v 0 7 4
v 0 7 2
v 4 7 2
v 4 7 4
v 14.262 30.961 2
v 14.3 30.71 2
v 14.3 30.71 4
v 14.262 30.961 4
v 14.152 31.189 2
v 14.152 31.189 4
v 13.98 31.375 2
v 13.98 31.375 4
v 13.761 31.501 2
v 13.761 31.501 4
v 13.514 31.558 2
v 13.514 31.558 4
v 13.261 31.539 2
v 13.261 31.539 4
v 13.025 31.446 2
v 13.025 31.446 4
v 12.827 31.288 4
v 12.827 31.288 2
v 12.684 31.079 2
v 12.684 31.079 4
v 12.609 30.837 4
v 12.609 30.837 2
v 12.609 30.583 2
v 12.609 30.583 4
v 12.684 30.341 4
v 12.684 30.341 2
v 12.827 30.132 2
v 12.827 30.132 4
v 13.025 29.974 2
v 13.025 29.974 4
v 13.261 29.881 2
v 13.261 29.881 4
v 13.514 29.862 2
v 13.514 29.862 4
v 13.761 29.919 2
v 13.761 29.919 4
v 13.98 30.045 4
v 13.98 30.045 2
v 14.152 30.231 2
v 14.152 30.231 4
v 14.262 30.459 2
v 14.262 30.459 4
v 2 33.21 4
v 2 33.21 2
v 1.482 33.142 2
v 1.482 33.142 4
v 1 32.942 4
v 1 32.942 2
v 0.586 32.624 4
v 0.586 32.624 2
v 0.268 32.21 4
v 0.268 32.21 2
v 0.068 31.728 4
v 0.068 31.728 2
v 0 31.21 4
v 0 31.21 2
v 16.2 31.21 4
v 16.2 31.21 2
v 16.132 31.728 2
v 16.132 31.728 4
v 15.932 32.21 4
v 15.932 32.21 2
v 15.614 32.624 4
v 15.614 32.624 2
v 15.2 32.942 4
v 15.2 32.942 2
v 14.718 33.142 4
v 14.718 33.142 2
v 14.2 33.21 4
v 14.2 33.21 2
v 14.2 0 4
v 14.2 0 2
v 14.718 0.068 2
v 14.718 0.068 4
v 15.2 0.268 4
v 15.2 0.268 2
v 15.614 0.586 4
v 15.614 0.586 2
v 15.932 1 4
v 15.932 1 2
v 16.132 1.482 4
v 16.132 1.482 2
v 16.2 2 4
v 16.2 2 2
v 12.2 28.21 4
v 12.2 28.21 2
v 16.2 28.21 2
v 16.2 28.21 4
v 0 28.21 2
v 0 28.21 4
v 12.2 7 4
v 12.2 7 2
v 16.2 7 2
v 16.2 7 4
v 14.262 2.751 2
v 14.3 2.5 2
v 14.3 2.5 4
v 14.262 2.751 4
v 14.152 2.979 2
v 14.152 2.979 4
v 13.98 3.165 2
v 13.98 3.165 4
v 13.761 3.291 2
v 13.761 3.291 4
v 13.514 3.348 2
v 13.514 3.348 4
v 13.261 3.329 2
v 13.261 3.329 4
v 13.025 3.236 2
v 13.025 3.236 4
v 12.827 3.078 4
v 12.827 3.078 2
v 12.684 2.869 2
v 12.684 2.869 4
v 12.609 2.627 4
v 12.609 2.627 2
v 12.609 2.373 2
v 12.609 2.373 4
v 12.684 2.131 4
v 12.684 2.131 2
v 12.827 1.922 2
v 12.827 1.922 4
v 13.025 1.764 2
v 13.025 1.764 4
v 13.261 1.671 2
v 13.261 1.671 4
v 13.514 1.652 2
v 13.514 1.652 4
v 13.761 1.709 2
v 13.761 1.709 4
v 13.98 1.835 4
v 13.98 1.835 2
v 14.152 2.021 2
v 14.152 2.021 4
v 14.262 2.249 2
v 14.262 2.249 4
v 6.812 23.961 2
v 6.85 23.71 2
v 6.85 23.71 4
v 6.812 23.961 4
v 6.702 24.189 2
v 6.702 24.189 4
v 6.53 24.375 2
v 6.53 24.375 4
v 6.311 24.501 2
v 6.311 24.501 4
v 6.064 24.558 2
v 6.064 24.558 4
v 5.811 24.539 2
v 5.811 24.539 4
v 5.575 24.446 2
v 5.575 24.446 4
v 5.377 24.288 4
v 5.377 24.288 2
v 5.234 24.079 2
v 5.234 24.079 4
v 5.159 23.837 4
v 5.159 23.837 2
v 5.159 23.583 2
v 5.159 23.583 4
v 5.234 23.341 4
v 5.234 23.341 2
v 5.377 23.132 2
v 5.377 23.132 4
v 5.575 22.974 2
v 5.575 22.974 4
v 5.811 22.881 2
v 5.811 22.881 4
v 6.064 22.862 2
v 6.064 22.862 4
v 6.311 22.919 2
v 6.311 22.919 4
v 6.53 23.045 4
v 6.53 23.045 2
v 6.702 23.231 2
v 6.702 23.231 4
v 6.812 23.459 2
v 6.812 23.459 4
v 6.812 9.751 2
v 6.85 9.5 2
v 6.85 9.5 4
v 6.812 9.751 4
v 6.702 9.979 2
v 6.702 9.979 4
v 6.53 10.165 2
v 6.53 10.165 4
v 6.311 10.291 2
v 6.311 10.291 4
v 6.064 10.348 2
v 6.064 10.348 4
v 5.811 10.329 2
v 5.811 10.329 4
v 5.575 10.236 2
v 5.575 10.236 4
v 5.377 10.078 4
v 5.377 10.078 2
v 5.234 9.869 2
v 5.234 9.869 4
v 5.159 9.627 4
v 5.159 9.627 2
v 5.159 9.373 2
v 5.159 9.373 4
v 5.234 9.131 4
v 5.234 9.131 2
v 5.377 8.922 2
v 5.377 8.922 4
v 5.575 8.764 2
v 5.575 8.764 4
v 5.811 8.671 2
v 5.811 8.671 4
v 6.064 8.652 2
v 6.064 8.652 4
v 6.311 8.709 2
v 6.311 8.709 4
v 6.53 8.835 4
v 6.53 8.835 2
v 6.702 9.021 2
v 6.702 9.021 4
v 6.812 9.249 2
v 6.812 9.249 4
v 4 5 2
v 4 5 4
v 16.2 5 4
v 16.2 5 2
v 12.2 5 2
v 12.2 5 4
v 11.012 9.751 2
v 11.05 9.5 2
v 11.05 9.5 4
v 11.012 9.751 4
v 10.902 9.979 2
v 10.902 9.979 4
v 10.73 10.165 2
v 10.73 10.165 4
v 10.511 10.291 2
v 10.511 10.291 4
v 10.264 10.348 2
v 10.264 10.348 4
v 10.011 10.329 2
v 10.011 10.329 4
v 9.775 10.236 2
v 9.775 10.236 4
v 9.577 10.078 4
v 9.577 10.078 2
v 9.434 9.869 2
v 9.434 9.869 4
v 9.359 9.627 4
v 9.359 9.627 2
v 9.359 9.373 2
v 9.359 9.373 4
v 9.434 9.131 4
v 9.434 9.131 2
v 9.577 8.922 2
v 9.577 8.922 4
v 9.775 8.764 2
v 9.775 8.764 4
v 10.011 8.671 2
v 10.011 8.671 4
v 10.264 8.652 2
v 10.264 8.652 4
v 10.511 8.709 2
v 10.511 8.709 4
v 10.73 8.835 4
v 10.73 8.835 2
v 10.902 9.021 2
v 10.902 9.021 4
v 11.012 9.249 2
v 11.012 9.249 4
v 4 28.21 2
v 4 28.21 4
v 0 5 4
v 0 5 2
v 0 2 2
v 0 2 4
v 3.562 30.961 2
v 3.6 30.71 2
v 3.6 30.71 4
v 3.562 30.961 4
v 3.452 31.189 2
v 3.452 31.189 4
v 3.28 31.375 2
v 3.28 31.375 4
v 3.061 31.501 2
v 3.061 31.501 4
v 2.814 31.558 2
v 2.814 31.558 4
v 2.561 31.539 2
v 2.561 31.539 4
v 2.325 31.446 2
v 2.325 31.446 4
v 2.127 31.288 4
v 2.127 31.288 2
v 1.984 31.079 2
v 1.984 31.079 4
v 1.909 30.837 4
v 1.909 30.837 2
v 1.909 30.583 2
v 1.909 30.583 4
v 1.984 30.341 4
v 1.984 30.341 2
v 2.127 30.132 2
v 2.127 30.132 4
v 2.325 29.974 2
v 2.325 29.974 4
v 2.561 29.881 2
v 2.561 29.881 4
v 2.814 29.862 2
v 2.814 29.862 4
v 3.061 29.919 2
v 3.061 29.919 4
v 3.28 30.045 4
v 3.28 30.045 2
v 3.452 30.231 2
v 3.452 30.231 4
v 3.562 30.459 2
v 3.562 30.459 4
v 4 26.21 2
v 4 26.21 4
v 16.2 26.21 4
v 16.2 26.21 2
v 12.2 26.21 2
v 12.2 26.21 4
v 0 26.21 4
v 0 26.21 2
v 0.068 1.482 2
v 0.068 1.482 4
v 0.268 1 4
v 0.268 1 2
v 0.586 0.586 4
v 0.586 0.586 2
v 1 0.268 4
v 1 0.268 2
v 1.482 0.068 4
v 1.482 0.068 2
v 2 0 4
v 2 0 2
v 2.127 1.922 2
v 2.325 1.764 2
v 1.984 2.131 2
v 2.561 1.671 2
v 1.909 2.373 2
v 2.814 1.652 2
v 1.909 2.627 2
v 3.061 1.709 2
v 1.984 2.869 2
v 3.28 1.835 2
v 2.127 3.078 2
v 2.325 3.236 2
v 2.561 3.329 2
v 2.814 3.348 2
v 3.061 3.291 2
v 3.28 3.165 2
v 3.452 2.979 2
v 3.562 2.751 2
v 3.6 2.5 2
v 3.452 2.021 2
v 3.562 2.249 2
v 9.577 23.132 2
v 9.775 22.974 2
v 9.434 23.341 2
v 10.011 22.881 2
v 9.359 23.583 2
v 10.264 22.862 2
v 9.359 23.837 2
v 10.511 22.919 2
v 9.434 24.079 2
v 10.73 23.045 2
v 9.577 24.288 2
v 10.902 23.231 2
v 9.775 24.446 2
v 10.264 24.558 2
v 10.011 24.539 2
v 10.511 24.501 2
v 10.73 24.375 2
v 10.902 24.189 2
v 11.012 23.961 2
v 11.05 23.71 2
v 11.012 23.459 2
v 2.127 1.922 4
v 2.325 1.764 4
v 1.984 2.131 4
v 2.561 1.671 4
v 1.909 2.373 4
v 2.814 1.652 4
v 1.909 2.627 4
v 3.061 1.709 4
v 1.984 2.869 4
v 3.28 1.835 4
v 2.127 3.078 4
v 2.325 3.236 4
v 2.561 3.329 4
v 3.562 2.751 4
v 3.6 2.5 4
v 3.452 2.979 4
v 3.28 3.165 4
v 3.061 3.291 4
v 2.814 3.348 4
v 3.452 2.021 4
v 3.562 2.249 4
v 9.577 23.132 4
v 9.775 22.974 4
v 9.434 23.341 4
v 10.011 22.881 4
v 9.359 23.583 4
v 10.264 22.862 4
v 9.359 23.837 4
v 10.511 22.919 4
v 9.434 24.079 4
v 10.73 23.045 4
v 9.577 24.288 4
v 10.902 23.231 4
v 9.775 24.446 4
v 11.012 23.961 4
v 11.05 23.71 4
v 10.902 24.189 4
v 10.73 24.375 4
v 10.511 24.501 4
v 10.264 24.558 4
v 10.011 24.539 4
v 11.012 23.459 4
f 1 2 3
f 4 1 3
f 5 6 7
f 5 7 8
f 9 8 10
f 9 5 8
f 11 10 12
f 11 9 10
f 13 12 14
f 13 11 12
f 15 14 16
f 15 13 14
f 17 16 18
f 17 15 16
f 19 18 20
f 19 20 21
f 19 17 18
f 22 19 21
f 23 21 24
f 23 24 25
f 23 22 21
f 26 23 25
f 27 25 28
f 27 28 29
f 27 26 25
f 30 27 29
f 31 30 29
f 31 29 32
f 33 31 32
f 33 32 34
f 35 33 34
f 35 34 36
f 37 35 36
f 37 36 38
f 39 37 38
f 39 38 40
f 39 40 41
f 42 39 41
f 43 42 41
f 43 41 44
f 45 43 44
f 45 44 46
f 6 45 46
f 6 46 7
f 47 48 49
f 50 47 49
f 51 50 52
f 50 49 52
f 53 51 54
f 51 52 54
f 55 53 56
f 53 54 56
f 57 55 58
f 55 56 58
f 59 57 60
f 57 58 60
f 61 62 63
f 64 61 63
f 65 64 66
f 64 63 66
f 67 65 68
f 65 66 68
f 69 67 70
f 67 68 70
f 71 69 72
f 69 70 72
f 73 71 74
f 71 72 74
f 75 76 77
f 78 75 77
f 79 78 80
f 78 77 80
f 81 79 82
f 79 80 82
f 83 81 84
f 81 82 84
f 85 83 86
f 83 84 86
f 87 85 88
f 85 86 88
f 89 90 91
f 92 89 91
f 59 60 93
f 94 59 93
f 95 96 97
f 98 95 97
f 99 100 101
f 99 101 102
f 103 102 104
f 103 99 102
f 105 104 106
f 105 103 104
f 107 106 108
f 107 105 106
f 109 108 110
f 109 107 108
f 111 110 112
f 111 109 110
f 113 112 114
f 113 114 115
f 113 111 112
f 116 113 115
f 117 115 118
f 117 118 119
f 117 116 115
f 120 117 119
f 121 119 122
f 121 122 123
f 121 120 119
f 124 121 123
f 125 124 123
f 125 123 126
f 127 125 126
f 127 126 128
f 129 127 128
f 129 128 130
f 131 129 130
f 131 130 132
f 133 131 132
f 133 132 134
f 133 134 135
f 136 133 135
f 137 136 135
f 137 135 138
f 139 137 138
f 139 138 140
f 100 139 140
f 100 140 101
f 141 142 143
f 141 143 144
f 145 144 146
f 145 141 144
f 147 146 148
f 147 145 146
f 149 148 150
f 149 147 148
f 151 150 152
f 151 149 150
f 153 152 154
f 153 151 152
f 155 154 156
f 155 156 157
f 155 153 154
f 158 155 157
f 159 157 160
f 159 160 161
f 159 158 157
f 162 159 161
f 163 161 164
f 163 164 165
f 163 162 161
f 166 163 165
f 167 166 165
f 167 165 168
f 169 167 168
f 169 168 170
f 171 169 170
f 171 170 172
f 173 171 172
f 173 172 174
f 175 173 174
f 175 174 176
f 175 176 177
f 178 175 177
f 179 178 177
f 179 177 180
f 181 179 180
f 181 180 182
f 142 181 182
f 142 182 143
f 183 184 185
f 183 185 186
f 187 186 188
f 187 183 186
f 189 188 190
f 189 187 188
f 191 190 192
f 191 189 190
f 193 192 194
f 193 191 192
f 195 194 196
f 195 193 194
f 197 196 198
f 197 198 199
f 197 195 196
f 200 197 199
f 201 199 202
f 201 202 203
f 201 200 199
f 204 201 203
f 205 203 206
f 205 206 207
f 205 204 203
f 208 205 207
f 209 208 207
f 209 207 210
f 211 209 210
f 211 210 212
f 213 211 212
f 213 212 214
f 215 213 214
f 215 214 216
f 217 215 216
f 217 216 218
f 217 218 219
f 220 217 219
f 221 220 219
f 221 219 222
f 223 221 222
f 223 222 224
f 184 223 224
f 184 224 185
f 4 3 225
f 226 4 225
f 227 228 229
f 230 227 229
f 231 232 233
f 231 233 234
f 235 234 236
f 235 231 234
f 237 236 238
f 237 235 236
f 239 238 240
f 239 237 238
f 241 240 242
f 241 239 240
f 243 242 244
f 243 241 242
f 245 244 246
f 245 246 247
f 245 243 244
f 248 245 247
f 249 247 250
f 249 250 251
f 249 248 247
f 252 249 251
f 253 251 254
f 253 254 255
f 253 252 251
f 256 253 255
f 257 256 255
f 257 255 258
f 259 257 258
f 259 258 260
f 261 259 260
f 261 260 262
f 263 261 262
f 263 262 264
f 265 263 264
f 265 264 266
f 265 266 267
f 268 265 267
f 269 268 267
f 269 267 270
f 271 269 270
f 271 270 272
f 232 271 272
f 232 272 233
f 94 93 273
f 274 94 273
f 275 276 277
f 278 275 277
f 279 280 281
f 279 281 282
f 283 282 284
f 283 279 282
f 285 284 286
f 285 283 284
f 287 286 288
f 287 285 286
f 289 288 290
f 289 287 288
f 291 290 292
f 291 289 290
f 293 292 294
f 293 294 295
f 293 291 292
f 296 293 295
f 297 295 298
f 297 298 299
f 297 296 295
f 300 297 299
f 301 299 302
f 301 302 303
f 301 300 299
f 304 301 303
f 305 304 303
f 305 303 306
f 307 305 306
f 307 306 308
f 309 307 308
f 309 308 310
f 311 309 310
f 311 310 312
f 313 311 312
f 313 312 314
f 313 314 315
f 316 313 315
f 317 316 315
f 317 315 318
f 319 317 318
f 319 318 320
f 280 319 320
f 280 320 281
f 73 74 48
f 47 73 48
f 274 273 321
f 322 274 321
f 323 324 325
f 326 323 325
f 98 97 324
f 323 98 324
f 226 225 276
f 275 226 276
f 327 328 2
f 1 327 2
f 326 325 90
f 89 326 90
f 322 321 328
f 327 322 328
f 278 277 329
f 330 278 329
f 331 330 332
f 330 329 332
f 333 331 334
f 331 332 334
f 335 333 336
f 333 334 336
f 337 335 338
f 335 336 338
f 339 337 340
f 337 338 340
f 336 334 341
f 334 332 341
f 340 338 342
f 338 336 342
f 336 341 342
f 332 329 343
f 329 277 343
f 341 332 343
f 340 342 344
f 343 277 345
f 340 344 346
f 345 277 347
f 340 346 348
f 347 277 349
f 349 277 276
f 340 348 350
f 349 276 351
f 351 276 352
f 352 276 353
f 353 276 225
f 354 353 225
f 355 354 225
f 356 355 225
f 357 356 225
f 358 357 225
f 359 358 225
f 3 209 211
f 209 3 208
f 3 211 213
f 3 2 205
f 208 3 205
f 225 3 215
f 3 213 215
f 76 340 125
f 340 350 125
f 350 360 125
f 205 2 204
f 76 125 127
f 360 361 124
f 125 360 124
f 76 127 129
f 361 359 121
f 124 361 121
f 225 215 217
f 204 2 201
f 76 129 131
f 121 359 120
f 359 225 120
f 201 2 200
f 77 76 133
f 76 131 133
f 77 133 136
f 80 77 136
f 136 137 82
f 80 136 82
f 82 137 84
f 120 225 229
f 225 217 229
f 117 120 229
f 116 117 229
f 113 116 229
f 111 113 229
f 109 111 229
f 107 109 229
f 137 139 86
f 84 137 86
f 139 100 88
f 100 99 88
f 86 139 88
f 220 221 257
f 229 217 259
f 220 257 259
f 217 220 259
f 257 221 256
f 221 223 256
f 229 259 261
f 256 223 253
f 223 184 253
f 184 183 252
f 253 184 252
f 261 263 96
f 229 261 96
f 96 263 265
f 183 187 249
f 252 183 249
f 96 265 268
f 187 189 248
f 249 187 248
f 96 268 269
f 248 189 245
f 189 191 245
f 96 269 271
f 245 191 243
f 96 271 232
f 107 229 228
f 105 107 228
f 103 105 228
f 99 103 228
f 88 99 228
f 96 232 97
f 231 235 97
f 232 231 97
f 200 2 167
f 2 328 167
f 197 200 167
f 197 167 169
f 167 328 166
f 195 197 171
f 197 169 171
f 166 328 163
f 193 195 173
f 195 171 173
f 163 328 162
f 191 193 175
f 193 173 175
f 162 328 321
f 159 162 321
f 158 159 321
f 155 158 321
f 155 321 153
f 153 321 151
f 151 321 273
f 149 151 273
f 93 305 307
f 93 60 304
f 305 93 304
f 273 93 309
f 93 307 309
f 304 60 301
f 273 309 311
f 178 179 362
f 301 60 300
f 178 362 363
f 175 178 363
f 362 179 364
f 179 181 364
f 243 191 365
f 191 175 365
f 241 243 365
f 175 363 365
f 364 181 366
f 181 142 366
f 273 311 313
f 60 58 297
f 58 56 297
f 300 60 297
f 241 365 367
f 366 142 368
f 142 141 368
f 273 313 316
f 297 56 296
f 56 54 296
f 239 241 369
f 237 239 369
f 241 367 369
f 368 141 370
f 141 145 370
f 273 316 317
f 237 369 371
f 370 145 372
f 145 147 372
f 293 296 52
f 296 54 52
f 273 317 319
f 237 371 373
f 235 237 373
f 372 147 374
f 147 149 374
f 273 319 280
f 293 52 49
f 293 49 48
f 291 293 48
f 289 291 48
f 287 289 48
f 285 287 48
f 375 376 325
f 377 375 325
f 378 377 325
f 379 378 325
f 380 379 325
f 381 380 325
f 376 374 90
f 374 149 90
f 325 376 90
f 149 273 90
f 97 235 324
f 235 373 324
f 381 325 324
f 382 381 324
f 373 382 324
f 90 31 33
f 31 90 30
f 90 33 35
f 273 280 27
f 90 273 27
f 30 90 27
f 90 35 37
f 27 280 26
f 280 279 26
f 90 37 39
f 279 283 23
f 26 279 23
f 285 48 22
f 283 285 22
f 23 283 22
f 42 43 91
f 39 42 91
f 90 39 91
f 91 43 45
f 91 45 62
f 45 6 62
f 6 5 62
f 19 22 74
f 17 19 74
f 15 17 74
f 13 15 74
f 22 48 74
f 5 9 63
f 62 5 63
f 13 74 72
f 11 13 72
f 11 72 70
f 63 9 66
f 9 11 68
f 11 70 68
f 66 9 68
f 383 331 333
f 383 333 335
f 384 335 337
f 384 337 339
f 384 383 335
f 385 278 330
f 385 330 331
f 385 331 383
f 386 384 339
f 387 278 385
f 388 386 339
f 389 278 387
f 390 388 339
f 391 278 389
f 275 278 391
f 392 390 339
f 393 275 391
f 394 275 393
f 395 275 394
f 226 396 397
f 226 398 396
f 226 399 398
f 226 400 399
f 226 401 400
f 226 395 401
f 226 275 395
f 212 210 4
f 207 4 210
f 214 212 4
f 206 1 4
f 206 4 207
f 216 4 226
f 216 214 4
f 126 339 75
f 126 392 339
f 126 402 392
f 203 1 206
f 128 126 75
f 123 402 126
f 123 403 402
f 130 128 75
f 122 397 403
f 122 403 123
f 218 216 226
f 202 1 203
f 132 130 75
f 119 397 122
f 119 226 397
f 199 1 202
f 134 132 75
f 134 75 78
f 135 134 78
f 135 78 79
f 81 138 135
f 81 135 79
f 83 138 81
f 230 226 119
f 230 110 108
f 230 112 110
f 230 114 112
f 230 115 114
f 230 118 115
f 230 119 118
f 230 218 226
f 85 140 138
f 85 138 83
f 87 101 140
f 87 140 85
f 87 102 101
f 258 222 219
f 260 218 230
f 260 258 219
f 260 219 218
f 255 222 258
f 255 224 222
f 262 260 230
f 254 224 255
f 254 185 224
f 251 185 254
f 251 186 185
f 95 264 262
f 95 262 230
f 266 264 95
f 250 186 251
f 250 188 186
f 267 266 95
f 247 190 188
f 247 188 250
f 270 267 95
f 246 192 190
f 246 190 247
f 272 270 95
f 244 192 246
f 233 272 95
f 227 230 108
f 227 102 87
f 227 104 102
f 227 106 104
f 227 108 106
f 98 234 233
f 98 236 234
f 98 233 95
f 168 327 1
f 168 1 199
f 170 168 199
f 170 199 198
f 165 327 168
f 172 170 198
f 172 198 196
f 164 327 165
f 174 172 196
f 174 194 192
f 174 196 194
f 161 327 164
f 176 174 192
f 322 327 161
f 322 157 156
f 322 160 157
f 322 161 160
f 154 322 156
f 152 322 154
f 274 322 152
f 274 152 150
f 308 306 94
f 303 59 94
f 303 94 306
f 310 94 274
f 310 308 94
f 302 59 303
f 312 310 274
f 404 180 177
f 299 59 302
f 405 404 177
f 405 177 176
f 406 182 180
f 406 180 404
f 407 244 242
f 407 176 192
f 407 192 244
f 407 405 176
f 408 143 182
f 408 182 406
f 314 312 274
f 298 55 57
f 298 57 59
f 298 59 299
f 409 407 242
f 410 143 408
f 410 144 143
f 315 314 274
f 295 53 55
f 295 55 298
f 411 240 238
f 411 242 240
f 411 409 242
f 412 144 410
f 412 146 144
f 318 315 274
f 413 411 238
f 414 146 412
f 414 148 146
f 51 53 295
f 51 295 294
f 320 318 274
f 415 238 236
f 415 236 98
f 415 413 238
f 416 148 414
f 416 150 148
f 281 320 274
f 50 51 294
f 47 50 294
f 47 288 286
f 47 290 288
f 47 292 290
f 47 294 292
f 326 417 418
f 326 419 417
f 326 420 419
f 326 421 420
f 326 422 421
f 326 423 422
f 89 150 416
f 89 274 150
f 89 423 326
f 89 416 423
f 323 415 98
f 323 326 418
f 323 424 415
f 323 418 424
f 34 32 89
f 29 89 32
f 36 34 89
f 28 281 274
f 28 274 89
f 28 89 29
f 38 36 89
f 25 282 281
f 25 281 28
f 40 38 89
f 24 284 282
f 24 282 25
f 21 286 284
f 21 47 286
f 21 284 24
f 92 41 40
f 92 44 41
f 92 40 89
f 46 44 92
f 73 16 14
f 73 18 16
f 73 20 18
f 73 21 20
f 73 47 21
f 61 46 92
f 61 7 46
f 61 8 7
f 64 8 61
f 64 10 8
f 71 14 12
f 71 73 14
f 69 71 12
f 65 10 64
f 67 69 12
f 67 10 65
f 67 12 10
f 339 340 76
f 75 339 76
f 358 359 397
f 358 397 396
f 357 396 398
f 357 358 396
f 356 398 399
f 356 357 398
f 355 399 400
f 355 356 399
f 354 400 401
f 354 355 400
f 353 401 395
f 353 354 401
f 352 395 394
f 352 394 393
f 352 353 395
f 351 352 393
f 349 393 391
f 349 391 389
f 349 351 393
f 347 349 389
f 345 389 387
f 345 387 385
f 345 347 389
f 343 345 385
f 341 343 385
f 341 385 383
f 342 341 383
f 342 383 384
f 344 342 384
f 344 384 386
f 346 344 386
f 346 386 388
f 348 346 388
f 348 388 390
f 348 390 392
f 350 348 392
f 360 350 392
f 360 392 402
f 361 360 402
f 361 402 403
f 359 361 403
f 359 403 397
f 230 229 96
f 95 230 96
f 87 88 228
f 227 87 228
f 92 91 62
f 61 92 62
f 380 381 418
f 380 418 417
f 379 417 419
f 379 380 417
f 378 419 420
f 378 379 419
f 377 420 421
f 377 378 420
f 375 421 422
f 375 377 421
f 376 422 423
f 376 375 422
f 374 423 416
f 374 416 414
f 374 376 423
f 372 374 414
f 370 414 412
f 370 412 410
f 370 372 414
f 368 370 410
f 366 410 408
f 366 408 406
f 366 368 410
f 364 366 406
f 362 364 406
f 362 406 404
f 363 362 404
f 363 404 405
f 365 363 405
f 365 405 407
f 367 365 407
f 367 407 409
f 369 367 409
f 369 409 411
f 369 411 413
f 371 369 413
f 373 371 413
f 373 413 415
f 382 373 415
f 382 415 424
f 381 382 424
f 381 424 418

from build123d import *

# Parameters (mm, degrees)
SKETCH1_R           = 0.85
BOSS_EXTRUDE1_DEPTH = 4
SKETCH2_W           = 16.2
SKETCH2_H           = 33.21
CUT_EXTRUDE2_DEPTH  = 2


with BuildPart() as part:
    # Sketch1 → Boss-Extrude1 (new body)
    with BuildSketch(Plane.XY):
        with BuildLine():
            Line((0, 26.21), (0, 7))
            Line((0, 7), (4, 7))
            Line((4, 7), (4, 5))
            Line((4, 5), (0, 5))
            Line((0, 5), (0, 2))
            ThreePointArc((0, 2), (0.585786438, 0.585786438), (2, 0))
            Line((2, 0), (14.2, 0))
            ThreePointArc((14.2, 0), (15.614213562, 0.585786438), (16.2, 2))
            Line((16.2, 2), (16.2, 5))
            Line((16.2, 5), (12.2, 5))
            Line((12.2, 5), (12.2, 7))
            Line((12.2, 7), (16.2, 7))
            Line((16.2, 7), (16.2, 26.21))
            Line((16.2, 26.21), (12.2, 26.21))
            Line((12.2, 26.21), (12.2, 28.21))
            Line((12.2, 28.21), (16.2, 28.21))
            Line((16.2, 28.21), (16.2, 31.21))
            ThreePointArc((16.2, 31.21), (15.614213562, 32.624213562), (14.2, 33.21))
            Line((14.2, 33.21), (2, 33.21))
            ThreePointArc((2, 33.21), (0.585786438, 32.624213562), (0, 31.21))
            Line((0, 31.21), (0, 28.21))
            Line((0, 28.21), (4, 28.21))
            Line((4, 28.21), (4, 26.21))
            Line((4, 26.21), (0, 26.21))
        make_face()
        with Locations((13.45, 2.5)):
            Circle(SKETCH1_R, mode=Mode.SUBTRACT)
        with Locations((10.2, 9.5)):
            Circle(SKETCH1_R, mode=Mode.SUBTRACT)
        with Locations((2.75, 30.71)):
            Circle(SKETCH1_R, mode=Mode.SUBTRACT)
        with Locations((6, 23.71)):
            Circle(SKETCH1_R, mode=Mode.SUBTRACT)
        with Locations((6, 9.5)):
            Circle(SKETCH1_R, mode=Mode.SUBTRACT)
        with Locations((2.75, 2.5)):
            Circle(SKETCH1_R, mode=Mode.SUBTRACT)
        with Locations((10.2, 23.71)):
            Circle(SKETCH1_R, mode=Mode.SUBTRACT)
        with Locations((13.45, 30.71)):
            Circle(SKETCH1_R, mode=Mode.SUBTRACT)
    extrude(amount=BOSS_EXTRUDE1_DEPTH)

    # Sketch2 → Cut-Extrude2 (cut)
    with BuildSketch(Plane.XY):
        with Locations((8.1, 16.605)):
            Rectangle(SKETCH2_W, SKETCH2_H)
    extrude(amount=CUT_EXTRUDE2_DEPTH, mode=Mode.SUBTRACT)


solid = part.part
